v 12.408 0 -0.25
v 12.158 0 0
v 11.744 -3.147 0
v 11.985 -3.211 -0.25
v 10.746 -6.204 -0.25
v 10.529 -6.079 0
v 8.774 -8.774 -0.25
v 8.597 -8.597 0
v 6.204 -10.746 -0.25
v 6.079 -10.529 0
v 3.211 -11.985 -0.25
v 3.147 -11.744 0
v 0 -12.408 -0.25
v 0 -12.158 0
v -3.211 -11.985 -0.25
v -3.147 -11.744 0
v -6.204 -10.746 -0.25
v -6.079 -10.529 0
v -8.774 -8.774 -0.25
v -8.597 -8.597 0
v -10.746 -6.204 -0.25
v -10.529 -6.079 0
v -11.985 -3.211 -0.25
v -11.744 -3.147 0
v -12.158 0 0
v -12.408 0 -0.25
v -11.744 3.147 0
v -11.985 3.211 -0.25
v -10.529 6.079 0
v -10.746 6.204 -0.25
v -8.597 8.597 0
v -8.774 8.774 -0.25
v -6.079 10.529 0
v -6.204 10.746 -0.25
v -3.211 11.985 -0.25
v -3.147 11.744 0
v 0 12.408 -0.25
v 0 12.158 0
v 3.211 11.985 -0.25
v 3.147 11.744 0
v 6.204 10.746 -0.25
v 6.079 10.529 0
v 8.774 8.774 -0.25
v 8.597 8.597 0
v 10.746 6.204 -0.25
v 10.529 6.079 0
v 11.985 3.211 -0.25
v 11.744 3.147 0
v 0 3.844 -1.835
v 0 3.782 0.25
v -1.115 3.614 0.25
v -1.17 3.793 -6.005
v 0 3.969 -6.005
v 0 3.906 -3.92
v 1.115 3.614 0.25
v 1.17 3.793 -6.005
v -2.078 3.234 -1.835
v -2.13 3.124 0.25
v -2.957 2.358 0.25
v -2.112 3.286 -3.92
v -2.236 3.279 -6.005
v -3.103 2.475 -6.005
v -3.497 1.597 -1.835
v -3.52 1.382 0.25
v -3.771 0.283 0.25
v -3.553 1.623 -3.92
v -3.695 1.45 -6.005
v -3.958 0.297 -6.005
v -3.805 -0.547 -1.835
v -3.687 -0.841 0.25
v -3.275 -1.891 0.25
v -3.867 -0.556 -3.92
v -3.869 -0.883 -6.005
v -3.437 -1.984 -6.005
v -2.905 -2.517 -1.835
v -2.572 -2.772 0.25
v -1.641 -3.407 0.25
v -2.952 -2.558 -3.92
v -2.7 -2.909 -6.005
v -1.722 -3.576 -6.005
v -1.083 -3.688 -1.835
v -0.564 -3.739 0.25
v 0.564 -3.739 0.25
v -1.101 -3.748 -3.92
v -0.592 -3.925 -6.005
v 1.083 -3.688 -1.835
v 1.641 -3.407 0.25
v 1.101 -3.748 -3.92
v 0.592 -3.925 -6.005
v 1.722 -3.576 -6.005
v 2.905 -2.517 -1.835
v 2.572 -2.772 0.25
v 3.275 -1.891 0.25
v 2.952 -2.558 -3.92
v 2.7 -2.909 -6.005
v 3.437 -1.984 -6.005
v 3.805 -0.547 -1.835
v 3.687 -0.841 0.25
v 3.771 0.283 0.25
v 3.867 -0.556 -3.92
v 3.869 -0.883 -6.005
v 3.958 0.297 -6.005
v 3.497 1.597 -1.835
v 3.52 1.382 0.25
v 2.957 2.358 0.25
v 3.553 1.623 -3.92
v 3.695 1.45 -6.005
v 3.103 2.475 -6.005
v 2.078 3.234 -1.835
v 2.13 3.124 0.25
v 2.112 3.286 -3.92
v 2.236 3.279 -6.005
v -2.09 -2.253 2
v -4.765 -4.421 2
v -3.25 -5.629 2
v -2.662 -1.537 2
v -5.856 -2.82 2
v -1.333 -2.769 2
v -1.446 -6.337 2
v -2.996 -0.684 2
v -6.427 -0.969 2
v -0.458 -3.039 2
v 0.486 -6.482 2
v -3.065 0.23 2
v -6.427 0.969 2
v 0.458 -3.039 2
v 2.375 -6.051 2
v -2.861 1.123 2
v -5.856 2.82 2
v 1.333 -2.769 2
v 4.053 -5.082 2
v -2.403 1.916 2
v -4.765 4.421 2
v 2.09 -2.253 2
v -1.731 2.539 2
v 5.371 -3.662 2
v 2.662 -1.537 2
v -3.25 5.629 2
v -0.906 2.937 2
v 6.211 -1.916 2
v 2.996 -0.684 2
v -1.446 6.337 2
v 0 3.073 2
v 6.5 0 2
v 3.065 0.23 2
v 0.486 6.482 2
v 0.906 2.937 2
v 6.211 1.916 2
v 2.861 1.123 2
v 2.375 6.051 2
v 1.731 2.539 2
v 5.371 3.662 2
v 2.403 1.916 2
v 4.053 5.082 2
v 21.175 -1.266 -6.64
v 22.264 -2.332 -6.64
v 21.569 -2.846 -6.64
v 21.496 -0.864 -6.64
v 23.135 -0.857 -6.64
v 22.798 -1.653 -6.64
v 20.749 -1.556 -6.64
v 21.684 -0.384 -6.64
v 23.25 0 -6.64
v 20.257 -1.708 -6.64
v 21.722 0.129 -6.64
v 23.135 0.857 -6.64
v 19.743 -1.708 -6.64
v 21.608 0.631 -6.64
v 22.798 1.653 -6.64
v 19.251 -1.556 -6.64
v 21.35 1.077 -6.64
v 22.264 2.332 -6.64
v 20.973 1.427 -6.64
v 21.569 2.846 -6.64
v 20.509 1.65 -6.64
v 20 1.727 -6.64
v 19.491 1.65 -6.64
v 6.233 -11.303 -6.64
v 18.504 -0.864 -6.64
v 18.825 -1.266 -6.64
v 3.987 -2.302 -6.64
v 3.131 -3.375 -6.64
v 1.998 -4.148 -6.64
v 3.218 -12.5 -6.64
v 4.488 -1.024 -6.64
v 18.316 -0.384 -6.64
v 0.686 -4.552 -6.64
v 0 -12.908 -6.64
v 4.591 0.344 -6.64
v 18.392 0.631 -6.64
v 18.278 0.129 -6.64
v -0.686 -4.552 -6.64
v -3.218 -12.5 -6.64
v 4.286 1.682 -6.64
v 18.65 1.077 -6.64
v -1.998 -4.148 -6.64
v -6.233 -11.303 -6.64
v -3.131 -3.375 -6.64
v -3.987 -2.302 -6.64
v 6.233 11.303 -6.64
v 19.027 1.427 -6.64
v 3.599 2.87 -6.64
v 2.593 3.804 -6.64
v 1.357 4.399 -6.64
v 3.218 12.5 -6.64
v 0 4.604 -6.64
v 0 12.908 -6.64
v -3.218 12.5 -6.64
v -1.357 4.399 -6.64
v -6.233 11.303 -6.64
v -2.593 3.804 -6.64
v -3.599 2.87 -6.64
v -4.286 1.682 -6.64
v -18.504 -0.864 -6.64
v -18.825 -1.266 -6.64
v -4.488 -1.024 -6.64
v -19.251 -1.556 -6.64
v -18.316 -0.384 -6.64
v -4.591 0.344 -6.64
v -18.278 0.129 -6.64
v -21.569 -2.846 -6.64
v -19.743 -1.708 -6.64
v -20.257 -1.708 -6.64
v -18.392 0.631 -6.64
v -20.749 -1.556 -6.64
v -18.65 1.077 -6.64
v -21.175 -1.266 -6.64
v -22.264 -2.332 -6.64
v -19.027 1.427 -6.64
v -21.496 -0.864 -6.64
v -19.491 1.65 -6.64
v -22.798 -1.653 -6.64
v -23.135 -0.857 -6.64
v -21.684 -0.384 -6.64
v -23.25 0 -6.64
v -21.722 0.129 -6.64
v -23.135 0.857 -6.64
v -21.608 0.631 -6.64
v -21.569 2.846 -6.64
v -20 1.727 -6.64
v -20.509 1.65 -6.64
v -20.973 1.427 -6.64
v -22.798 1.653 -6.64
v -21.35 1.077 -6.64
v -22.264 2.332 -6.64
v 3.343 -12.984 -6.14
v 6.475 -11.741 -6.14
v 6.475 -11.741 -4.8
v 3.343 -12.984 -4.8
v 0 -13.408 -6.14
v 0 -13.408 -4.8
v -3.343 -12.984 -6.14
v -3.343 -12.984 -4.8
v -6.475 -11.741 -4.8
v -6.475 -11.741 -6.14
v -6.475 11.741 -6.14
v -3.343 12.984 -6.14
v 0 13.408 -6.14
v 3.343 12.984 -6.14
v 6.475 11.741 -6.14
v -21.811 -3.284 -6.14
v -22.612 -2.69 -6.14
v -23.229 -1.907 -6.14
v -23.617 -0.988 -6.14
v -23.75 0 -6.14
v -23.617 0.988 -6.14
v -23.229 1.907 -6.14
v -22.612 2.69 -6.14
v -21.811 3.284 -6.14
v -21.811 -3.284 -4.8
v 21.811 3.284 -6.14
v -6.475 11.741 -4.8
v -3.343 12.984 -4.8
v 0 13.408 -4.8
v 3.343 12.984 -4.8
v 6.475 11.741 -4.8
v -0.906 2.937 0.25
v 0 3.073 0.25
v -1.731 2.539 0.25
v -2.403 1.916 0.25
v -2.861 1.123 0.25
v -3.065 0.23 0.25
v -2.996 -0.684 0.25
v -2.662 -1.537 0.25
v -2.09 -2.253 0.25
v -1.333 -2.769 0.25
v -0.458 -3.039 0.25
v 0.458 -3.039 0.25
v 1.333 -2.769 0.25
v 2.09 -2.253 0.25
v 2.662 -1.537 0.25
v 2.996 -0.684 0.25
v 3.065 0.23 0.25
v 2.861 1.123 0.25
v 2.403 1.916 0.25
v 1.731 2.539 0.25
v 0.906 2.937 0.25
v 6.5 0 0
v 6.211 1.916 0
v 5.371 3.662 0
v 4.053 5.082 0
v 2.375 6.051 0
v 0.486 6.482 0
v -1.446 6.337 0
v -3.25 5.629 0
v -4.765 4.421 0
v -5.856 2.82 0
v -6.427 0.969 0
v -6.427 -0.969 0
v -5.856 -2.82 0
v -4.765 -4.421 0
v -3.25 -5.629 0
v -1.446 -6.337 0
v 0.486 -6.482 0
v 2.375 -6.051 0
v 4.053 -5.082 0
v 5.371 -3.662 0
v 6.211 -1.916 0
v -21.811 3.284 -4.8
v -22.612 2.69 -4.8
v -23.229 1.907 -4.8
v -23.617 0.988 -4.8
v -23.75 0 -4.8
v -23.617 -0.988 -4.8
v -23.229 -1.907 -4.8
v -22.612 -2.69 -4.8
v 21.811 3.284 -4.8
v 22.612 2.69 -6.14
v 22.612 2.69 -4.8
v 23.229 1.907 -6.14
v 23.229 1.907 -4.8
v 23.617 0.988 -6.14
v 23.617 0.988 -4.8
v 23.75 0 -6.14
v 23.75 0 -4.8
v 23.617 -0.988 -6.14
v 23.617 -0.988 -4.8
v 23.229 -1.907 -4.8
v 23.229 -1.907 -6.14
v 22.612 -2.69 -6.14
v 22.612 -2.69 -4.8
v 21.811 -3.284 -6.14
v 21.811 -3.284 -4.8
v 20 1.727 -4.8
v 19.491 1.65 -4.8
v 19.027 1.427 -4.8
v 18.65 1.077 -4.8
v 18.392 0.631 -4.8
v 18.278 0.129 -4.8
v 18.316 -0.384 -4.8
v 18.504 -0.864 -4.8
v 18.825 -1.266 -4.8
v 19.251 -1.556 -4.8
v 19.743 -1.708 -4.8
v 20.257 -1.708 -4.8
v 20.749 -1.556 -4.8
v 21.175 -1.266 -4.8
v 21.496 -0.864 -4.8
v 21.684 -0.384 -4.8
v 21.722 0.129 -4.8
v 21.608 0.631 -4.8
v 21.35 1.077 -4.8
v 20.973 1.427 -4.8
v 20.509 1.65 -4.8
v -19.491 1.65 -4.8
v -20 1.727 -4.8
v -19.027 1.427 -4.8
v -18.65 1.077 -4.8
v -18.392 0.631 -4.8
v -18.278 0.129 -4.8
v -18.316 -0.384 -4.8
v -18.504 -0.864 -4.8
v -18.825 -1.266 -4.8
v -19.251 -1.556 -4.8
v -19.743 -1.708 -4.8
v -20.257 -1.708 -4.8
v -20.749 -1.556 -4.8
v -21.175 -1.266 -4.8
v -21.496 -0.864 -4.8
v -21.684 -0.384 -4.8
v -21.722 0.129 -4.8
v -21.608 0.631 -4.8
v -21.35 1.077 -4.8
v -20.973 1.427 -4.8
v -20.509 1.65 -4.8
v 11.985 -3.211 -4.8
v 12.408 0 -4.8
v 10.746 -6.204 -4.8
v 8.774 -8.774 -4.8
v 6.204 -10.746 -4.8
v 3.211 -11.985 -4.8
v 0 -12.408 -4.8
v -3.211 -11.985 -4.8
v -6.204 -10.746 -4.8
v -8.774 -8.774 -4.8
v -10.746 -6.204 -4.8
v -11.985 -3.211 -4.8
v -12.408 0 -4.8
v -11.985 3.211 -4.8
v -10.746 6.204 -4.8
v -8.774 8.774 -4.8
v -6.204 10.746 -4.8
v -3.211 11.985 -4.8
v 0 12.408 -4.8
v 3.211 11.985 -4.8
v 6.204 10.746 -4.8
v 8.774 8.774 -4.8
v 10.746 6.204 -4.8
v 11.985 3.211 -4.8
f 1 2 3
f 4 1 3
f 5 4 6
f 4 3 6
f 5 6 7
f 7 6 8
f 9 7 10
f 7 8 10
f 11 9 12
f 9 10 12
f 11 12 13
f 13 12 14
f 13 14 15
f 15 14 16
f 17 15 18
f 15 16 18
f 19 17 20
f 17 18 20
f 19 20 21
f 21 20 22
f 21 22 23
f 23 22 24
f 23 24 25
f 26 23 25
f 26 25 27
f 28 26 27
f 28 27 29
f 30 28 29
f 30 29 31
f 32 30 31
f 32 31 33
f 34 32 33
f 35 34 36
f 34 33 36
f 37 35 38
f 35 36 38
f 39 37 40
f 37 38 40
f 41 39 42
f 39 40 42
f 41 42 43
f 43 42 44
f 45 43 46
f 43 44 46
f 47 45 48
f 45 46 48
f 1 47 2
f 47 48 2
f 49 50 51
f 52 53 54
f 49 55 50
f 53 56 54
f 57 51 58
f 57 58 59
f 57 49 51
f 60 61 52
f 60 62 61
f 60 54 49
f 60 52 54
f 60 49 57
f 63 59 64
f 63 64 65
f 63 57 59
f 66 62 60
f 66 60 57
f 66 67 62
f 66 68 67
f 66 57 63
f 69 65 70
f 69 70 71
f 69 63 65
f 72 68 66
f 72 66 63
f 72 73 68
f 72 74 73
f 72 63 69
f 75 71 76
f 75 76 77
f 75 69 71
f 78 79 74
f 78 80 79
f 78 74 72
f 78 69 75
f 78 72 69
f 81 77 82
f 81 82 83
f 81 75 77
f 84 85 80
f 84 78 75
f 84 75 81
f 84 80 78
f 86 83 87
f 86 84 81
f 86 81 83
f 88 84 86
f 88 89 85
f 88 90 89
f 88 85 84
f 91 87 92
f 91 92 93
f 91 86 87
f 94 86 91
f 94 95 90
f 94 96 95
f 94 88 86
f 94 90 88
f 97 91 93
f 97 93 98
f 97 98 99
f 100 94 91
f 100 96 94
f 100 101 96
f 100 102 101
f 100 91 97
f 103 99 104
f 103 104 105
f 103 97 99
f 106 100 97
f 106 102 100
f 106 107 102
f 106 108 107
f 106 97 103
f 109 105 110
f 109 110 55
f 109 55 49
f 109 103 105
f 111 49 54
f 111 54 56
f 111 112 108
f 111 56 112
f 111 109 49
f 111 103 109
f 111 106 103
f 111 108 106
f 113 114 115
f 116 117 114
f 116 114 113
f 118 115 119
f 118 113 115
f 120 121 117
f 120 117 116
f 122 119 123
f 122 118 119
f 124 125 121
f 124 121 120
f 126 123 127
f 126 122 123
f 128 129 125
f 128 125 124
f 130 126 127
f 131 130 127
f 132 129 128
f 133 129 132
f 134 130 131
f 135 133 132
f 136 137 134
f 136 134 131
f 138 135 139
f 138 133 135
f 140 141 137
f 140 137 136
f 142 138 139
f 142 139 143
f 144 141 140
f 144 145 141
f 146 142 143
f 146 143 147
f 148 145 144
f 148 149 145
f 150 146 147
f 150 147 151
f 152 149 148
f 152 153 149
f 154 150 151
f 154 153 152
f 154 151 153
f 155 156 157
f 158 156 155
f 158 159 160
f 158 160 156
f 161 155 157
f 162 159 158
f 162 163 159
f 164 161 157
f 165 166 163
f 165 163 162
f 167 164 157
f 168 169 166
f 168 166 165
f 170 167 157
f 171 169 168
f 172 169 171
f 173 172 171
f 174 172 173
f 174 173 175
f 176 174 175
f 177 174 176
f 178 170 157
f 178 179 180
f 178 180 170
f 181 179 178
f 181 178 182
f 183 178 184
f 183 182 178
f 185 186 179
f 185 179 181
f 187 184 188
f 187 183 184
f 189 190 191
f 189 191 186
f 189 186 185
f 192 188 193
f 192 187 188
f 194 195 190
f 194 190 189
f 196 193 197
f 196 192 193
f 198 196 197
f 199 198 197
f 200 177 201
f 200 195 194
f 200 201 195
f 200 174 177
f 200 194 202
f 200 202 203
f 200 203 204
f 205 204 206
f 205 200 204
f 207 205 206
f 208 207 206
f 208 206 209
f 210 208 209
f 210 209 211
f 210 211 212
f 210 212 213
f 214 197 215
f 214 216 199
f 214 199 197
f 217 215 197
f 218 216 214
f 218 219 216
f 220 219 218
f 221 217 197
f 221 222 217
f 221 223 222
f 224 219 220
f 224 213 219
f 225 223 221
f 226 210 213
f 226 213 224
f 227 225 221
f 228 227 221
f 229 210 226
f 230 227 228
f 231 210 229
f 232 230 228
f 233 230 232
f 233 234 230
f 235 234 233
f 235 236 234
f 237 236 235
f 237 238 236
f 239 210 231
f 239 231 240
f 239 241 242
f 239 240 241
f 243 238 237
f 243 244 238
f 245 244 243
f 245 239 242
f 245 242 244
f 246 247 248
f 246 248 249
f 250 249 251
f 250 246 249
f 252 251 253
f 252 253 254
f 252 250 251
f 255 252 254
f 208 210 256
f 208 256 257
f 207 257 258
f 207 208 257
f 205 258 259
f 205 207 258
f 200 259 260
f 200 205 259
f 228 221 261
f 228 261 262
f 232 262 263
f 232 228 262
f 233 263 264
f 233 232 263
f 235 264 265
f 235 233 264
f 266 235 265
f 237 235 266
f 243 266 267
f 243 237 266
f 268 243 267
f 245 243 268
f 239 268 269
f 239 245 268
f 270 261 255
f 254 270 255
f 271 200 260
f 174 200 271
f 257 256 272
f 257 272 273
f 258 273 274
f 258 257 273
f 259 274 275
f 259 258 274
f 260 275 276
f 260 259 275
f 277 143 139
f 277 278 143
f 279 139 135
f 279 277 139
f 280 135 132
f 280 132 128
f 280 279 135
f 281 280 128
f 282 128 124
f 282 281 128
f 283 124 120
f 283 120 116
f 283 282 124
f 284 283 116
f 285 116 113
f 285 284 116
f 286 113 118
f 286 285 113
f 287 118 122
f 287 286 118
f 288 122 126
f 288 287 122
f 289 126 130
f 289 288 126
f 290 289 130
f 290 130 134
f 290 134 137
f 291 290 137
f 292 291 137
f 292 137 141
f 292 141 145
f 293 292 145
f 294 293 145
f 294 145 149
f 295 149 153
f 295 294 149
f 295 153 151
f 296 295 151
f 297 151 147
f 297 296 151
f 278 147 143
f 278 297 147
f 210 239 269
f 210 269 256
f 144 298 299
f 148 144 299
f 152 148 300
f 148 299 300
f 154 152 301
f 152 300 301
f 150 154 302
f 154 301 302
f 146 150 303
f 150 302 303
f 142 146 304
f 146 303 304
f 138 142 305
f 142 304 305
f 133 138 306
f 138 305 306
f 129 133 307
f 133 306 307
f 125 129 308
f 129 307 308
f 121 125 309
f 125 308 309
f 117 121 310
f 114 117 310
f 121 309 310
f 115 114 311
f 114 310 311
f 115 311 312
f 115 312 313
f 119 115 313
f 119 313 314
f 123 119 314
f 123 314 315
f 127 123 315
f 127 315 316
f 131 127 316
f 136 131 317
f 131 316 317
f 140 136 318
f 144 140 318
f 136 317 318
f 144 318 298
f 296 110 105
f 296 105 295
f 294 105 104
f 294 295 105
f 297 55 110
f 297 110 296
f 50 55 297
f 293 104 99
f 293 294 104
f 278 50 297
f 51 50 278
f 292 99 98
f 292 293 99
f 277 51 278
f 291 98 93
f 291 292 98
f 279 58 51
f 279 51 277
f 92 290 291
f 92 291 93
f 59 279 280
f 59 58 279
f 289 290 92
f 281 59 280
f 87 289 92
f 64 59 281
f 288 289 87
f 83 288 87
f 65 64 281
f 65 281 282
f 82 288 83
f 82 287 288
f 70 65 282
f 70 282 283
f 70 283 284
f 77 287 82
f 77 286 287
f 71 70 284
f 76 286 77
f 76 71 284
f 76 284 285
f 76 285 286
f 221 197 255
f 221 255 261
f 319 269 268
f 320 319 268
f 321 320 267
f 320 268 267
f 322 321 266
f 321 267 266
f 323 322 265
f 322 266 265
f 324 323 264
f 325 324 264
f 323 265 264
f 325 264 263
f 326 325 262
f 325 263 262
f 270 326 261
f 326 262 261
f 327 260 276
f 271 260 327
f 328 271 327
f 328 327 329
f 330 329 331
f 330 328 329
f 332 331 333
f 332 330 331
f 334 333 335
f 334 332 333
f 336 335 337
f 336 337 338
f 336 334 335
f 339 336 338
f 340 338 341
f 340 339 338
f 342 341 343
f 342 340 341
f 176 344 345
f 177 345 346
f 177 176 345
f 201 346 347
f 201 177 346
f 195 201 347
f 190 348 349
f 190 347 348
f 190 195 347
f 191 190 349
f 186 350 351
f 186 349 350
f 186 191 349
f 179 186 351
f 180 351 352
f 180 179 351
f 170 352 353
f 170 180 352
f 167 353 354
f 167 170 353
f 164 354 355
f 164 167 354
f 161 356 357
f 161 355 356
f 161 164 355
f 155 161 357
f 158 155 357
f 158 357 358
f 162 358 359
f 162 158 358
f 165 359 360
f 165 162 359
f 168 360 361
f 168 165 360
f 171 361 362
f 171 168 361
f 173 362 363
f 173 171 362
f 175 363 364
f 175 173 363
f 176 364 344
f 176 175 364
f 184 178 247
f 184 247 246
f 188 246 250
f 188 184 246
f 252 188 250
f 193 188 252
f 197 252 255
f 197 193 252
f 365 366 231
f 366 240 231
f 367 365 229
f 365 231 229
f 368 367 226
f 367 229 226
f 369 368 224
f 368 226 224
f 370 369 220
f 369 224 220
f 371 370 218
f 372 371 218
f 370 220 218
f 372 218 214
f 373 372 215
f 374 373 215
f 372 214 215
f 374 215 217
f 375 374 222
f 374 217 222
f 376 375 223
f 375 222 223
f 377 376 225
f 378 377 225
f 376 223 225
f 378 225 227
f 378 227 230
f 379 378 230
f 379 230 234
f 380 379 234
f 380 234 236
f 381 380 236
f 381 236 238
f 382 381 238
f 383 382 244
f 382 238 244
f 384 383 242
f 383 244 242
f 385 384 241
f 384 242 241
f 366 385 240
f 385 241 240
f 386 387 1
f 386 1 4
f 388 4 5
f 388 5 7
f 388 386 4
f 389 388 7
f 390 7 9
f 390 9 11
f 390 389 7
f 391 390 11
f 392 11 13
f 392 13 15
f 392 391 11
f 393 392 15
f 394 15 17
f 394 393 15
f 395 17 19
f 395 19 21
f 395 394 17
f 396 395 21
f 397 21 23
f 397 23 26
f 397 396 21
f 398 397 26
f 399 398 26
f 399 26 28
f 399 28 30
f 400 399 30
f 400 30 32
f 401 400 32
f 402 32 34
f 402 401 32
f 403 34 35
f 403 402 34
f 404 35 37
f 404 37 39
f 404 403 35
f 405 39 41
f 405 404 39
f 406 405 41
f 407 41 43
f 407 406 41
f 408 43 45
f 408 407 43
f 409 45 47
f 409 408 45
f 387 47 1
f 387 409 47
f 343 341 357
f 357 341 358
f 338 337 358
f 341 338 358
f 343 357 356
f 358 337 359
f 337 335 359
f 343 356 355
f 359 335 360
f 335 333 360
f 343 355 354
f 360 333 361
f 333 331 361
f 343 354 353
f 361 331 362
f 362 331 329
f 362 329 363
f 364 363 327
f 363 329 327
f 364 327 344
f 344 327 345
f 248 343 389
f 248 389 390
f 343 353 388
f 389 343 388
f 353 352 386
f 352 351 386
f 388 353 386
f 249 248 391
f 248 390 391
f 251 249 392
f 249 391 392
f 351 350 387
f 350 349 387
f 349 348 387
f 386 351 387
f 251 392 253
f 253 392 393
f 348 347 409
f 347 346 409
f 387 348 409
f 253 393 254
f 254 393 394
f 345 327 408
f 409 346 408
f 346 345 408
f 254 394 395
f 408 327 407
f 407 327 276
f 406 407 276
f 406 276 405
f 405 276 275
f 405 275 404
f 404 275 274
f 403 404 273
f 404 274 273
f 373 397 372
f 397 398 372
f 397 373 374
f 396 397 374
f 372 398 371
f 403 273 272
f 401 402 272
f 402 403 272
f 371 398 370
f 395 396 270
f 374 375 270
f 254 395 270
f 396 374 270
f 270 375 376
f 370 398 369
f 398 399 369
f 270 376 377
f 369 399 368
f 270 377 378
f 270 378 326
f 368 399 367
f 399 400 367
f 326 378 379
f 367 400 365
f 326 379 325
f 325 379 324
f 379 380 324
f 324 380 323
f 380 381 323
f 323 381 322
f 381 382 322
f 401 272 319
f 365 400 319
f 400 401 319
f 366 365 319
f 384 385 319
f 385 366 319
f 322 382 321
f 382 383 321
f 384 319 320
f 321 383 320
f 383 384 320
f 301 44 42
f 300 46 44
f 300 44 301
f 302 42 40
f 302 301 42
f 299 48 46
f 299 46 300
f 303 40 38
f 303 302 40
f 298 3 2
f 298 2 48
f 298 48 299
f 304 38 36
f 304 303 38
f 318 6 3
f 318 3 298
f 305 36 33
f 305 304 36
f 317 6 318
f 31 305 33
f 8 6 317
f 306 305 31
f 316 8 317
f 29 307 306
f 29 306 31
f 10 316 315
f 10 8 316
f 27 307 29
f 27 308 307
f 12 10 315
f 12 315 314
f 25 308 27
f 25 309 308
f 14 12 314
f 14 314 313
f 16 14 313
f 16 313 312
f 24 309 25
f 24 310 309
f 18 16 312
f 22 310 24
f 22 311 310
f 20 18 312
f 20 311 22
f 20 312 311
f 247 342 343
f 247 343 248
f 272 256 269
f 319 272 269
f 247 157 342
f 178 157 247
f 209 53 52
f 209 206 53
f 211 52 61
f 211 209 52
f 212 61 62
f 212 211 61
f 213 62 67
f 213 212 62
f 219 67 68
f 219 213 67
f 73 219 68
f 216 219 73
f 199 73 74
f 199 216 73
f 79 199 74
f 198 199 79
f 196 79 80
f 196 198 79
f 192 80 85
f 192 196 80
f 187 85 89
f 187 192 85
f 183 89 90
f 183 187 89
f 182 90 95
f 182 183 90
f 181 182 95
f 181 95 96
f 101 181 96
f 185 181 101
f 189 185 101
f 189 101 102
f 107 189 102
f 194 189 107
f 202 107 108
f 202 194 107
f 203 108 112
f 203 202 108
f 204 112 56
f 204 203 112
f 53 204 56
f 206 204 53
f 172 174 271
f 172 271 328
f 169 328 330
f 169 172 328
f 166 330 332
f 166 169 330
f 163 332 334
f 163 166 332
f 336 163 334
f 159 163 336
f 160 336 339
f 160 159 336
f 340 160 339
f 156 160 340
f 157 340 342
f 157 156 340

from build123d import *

# Parameters (mm, degrees)
SKETCH2_R           = 6.5
BOSS_EXTRUDE1_DEPTH = 2
BOSS_EXTRUDE2_DEPTH = 1.84
CHAMFER1_SIZE       = 0.25
CHAMFER2_SIZE       = 0.5


with BuildPart() as part:
    # Sketch1 → Revolve1 (revolve)
    with BuildSketch(Plane(origin=(0, 0, 0), x_dir=(1, 0, 0), z_dir=(0, 1, 0))):
        Polygon((0, 0), (12.4079, 0), (12.4079, 4.8), (13.4079, 4.8), (13.4079, 6.64), (0, 6.64), align=None)
    revolve(axis=Axis((0, 0, 0), (0, 0, -1)))

    # Sketch2 → Boss-Extrude1 (add)
    with BuildSketch(Plane.XY):
        Circle(SKETCH2_R)
    extrude(amount=BOSS_EXTRUDE1_DEPTH)

    # Sketch3 → Boss-Extrude2 (add)
    with BuildSketch(Plane(origin=(0, 0, -6.64), x_dir=(-1, 0, 0), z_dir=(0, 0, -1))):
        with BuildLine():
            Line((-21.81085625, -3.283793483), (-6.47460787, -11.741006572))
            ThreePointArc((-6.47460787, -11.741006572), (-13.4079, 0), (-6.474607871, 11.741006572))
            Line((-6.474607871, 11.741006572), (-21.81085625, 3.283793483))
            ThreePointArc((-21.81085625, 3.283793483), (-23.75, 0), (-21.81085625, -3.283793483))
        make_face()
    boss_extrude2 = extrude(amount=-BOSS_EXTRUDE2_DEPTH)

    # Sketch4 → #4 Clearance Hole1 (revolve, cut)
    with BuildSketch(Plane(origin=(20, 0, -6.64), x_dir=(0, 1, 0), z_dir=(1, 0, 0))):
        Polygon((0, 0), (0, 16.037806461), (1.7272, 15), (1.7272, 0), align=None)
    f_4_clearance_hole1 = revolve(axis=Axis((20, 0, -12.99), (0, 0, 1)), mode=Mode.SUBTRACT)

    # Mirror1: Boss-Extrude2, #4 Clearance Hole1 across plane
    add(boss_extrude2.mirror(Plane(origin=(0, 0, 0), x_dir=(0, 0, 1), z_dir=(1, 0, 0))))
    add(f_4_clearance_hole1.mirror(Plane(origin=(0, 0, 0), x_dir=(0, 0, 1), z_dir=(1, 0, 0))), mode=Mode.SUBTRACT)

    # Sketch8 → 1/16 NPT Tapped Hole2 (revolve, cut)
    with BuildSketch(Plane(origin=(0, 0, -6.64), x_dir=(0, 1, 0), z_dir=(1, 0, 0))):
        Polygon((0, 0), (0, 8.64), (3.0734, 8.64), (3.0734, 6.89), (3.781593923, 6.89), (3.968877, 0.635), (4.603877, 0), align=None)
    revolve(axis=Axis((0, 0, -12.99), (0, 0, 1)), mode=Mode.SUBTRACT)

    # Chamfer1
    chamfer1_edges = [part.edges().sort_by_distance(p)[0] for p in [
        (-12.4079, 0, 0),
    ]]
    chamfer(chamfer1_edges, length=CHAMFER1_SIZE)

    # Chamfer2
    chamfer2_edges = [part.edges().sort_by_distance(p)[0] for p in [
        (23.75, 0, -6.64),
        (14.14273206, -7.512400028, -6.64),
        (14.14273206, 7.512400028, -6.64),
        (0, -13.4079, -6.64),
        (-23.75, 0, -6.64),
        (-14.14273206, -7.512400028, -6.64),
        (-14.14273206, 7.512400028, -6.64),
        (0, 13.4079, -6.64),
    ]]
    chamfer(chamfer2_edges, length=CHAMFER2_SIZE)


solid = part.part
